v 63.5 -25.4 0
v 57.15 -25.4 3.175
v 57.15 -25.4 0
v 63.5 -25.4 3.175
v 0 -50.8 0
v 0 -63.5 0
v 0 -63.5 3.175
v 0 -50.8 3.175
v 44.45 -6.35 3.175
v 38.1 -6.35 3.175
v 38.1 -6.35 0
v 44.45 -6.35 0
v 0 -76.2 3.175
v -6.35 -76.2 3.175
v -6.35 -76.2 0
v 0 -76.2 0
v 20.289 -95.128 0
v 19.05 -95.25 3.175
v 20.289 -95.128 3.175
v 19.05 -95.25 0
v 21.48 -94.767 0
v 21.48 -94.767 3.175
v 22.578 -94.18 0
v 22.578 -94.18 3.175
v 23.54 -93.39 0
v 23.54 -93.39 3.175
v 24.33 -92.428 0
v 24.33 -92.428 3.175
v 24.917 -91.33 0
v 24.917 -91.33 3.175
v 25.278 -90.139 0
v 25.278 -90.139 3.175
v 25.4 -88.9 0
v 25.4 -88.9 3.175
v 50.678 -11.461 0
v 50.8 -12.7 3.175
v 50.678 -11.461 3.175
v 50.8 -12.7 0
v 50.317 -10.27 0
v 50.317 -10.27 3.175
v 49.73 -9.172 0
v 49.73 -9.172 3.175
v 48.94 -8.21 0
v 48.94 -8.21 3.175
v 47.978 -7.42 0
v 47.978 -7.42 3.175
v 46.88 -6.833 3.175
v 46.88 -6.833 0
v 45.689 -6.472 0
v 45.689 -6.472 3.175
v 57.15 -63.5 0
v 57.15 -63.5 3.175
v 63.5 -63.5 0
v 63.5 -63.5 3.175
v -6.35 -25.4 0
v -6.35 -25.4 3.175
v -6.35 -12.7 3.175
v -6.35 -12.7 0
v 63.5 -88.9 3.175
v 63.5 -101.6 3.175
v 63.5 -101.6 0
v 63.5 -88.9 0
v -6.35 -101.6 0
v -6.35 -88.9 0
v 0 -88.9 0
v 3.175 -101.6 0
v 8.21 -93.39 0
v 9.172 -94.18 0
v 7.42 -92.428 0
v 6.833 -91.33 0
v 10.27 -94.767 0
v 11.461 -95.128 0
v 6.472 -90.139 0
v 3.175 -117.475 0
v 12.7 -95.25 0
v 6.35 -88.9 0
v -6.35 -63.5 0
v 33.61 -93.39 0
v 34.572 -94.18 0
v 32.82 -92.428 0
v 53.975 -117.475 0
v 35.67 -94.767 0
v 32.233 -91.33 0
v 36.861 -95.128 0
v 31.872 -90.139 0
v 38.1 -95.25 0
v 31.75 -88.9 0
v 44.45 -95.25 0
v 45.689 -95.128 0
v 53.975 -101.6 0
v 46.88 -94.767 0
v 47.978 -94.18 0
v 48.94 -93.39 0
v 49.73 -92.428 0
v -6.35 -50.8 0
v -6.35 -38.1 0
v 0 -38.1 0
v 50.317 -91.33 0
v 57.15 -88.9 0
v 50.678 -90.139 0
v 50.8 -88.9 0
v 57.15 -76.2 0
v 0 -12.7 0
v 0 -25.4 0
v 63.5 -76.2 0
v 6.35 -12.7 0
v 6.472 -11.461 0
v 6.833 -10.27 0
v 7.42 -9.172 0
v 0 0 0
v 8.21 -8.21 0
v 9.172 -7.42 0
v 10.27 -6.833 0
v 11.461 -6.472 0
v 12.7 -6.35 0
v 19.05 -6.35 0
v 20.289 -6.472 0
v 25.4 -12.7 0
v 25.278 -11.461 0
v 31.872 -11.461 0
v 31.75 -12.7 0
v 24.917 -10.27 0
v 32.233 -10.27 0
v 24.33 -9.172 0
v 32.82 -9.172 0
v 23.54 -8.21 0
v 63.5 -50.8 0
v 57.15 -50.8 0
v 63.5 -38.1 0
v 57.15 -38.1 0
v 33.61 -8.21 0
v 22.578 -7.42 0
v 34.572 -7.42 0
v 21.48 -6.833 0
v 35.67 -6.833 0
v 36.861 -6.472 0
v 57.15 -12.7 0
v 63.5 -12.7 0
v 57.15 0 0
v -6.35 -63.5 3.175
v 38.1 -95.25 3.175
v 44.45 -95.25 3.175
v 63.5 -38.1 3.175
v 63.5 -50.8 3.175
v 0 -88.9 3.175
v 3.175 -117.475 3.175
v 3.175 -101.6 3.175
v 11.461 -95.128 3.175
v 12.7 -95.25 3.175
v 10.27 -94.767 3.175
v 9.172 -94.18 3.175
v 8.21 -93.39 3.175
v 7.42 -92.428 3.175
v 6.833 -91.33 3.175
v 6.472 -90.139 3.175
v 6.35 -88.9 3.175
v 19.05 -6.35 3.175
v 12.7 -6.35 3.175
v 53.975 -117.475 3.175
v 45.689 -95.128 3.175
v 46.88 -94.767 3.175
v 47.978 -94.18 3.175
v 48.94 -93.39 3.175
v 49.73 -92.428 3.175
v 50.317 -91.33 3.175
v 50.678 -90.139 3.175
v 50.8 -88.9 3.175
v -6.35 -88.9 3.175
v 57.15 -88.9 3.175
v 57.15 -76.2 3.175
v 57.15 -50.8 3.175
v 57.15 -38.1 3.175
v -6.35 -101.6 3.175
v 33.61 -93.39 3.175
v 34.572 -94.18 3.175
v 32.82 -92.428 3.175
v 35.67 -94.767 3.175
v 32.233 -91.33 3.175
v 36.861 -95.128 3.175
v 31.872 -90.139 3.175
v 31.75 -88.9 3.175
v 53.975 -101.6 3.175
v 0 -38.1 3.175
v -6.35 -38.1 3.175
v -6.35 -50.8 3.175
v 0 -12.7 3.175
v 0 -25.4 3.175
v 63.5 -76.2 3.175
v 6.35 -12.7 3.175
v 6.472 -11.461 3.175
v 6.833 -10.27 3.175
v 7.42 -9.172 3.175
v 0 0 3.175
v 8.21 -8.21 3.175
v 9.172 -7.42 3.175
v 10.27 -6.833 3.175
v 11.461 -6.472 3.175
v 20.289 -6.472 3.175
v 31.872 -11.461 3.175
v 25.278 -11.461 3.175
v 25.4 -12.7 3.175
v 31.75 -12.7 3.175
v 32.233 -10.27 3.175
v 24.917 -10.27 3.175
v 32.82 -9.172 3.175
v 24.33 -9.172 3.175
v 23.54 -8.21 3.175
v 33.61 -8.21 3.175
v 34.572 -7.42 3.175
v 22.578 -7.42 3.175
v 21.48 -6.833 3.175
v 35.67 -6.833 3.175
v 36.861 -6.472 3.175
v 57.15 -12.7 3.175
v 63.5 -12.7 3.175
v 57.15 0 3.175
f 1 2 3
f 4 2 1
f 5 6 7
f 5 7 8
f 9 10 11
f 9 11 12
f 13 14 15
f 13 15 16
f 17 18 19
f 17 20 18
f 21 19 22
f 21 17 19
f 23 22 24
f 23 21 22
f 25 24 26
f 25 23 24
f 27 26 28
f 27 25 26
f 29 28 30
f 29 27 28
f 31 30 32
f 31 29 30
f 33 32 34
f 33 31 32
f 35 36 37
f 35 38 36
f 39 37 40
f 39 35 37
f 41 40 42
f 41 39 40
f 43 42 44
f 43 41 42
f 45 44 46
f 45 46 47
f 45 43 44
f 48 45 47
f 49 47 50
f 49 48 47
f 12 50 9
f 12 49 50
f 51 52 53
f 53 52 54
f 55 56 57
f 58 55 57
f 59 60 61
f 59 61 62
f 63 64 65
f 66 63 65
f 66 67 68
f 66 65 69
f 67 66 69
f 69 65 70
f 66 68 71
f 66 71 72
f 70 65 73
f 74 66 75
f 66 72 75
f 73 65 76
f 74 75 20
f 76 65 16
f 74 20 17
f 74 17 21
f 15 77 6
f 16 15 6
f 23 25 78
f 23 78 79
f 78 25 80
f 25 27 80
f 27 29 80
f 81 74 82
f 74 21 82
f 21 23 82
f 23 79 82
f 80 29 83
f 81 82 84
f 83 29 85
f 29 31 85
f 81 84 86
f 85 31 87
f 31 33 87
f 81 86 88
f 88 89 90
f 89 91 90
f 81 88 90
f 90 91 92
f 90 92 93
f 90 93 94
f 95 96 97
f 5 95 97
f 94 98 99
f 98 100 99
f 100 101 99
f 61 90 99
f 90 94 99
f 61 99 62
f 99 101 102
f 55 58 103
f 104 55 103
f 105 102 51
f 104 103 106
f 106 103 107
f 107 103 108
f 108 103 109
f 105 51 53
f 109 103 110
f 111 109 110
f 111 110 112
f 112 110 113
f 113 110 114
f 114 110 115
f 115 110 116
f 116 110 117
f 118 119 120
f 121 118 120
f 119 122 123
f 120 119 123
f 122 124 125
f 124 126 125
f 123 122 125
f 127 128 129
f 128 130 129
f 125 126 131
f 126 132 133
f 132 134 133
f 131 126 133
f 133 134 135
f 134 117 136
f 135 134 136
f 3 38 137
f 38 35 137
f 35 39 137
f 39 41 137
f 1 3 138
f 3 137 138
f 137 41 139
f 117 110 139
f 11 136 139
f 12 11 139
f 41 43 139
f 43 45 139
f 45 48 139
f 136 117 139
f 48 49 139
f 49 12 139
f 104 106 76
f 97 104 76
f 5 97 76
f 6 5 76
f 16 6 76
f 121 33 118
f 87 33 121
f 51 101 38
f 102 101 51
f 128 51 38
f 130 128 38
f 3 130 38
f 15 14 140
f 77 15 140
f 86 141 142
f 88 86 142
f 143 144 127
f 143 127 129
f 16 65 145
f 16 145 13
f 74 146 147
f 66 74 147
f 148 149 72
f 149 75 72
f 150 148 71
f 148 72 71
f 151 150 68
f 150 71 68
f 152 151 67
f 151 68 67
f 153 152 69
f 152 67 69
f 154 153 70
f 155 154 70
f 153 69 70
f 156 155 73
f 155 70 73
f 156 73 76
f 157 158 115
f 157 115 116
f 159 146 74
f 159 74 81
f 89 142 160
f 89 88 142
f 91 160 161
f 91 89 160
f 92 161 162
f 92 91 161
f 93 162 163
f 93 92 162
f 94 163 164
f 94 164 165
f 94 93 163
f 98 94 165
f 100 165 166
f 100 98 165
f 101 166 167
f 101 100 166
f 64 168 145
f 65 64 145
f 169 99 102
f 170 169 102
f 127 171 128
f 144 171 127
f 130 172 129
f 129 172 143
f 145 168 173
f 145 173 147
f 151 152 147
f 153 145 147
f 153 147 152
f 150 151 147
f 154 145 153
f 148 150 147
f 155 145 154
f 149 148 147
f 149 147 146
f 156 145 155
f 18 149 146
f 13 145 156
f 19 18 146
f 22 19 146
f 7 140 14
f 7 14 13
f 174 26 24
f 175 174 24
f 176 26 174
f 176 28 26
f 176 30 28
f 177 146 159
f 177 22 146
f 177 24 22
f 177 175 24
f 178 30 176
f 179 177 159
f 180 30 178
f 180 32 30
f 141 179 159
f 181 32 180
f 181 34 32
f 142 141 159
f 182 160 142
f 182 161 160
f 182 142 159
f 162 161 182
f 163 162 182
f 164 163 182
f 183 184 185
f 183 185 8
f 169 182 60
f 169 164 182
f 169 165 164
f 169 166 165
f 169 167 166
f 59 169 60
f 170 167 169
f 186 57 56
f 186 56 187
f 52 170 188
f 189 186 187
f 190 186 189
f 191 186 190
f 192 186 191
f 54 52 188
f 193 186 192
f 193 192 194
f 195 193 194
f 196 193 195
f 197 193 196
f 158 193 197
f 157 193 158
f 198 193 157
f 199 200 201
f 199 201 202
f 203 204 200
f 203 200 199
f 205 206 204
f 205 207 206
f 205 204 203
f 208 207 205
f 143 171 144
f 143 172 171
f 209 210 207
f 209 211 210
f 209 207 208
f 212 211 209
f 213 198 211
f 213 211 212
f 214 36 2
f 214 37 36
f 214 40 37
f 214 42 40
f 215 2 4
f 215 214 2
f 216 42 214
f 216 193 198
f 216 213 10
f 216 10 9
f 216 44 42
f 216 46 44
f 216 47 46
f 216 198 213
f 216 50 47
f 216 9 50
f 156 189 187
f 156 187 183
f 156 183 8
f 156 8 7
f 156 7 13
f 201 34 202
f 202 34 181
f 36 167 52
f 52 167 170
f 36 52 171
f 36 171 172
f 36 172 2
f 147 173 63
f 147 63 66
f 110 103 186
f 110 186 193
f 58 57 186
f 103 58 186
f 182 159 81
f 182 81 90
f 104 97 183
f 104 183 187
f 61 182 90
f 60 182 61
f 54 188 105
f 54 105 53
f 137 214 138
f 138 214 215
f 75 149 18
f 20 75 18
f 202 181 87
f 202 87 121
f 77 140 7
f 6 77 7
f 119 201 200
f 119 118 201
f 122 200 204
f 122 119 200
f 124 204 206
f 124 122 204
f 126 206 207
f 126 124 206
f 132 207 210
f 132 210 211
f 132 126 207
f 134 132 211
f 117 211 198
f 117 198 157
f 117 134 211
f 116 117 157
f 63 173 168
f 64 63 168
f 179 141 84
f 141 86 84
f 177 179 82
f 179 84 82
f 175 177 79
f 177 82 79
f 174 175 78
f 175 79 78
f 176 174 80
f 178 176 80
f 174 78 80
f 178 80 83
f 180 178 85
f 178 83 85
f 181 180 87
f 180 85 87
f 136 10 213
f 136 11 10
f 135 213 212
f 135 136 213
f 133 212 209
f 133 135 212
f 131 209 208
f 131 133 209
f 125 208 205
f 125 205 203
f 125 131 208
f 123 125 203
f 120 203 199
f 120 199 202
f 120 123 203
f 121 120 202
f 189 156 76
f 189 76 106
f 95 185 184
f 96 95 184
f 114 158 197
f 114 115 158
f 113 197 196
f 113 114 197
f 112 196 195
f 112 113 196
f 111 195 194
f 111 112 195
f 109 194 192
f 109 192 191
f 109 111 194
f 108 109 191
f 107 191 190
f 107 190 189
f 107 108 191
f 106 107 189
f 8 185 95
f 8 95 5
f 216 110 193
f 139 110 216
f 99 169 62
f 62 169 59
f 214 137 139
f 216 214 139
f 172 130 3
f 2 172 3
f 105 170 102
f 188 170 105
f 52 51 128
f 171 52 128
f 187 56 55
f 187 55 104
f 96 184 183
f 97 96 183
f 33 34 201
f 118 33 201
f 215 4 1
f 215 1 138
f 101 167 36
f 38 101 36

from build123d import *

# Parameters (mm, degrees)
SKETCH1_W           = 57.15
SKETCH1_H           = 101.6
BOSS_EXTRUDE1_DEPTH = 3.175
SKETCH2_W           = 6.35
SKETCH2_H           = 12.7
BOSS_EXTRUDE2_DEPTH = 3.175
LPATTERN1_COUNT     = 4
LPATTERN1_PITCH     = 25.4
SKETCH3_W           = 50.8
SKETCH3_H           = 15.875
BOSS_EXTRUDE3_DEPTH = 3.175
SKETCH4_W           = 19.05
SKETCH4_H           = 88.9
CUT_EXTRUDE1_DEPTH  = 3.175
FILLET1_R           = 6.35


with BuildPart() as part:
    # Sketch1 → Boss-Extrude1 (new body)
    with BuildSketch(Plane.XY):
        with Locations((28.575, -50.8)):
            Rectangle(SKETCH1_W, SKETCH1_H)
    extrude(amount=BOSS_EXTRUDE1_DEPTH)

    # Sketch2 → Boss-Extrude2 (add)
    with BuildSketch(Plane.XY.offset(3.175)):
        with Locations((60.325, -19.05)):
            Rectangle(SKETCH2_W, SKETCH2_H)
        with Locations((-3.175, -19.05)):
            Rectangle(SKETCH2_W, SKETCH2_H)
    boss_extrude2 = extrude(amount=-BOSS_EXTRUDE2_DEPTH)

    # LPattern1: Boss-Extrude2 ×4
    with Locations(*[(0, -i * LPATTERN1_PITCH, 0) for i in range(1, LPATTERN1_COUNT)]):
        add(boss_extrude2)

    # Sketch3 → Boss-Extrude3 (add)
    with BuildSketch(Plane.XY.offset(3.175)):
        with Locations((28.575, -109.5375)):
            Rectangle(SKETCH3_W, SKETCH3_H)
    extrude(amount=-BOSS_EXTRUDE3_DEPTH)

    # Sketch4 → Cut-Extrude1 (cut)
    with BuildSketch(Plane.XY.offset(3.175)):
        with Locations((15.875, -50.8)):
            Rectangle(SKETCH4_W, SKETCH4_H)
        with Locations((41.275, -50.8)):
            Rectangle(SKETCH4_W, SKETCH4_H)
    extrude(amount=-CUT_EXTRUDE1_DEPTH, mode=Mode.SUBTRACT)

    # Fillet1
    fillet1_edges = [part.edges().sort_by_distance(p)[0] for p in [
        (6.35, -95.25, 1.5875),
        (6.35, -6.35, 1.5875),
        (25.4, -6.35, 1.5875),
        (25.4, -95.25, 1.5875),
        (50.8, -6.35, 1.5875),
        (50.8, -95.25, 1.5875),
        (31.75, -95.25, 1.5875),
        (31.75, -6.35, 1.5875),
    ]]
    fillet(fillet1_edges, radius=FILLET1_R)


solid = part.part
